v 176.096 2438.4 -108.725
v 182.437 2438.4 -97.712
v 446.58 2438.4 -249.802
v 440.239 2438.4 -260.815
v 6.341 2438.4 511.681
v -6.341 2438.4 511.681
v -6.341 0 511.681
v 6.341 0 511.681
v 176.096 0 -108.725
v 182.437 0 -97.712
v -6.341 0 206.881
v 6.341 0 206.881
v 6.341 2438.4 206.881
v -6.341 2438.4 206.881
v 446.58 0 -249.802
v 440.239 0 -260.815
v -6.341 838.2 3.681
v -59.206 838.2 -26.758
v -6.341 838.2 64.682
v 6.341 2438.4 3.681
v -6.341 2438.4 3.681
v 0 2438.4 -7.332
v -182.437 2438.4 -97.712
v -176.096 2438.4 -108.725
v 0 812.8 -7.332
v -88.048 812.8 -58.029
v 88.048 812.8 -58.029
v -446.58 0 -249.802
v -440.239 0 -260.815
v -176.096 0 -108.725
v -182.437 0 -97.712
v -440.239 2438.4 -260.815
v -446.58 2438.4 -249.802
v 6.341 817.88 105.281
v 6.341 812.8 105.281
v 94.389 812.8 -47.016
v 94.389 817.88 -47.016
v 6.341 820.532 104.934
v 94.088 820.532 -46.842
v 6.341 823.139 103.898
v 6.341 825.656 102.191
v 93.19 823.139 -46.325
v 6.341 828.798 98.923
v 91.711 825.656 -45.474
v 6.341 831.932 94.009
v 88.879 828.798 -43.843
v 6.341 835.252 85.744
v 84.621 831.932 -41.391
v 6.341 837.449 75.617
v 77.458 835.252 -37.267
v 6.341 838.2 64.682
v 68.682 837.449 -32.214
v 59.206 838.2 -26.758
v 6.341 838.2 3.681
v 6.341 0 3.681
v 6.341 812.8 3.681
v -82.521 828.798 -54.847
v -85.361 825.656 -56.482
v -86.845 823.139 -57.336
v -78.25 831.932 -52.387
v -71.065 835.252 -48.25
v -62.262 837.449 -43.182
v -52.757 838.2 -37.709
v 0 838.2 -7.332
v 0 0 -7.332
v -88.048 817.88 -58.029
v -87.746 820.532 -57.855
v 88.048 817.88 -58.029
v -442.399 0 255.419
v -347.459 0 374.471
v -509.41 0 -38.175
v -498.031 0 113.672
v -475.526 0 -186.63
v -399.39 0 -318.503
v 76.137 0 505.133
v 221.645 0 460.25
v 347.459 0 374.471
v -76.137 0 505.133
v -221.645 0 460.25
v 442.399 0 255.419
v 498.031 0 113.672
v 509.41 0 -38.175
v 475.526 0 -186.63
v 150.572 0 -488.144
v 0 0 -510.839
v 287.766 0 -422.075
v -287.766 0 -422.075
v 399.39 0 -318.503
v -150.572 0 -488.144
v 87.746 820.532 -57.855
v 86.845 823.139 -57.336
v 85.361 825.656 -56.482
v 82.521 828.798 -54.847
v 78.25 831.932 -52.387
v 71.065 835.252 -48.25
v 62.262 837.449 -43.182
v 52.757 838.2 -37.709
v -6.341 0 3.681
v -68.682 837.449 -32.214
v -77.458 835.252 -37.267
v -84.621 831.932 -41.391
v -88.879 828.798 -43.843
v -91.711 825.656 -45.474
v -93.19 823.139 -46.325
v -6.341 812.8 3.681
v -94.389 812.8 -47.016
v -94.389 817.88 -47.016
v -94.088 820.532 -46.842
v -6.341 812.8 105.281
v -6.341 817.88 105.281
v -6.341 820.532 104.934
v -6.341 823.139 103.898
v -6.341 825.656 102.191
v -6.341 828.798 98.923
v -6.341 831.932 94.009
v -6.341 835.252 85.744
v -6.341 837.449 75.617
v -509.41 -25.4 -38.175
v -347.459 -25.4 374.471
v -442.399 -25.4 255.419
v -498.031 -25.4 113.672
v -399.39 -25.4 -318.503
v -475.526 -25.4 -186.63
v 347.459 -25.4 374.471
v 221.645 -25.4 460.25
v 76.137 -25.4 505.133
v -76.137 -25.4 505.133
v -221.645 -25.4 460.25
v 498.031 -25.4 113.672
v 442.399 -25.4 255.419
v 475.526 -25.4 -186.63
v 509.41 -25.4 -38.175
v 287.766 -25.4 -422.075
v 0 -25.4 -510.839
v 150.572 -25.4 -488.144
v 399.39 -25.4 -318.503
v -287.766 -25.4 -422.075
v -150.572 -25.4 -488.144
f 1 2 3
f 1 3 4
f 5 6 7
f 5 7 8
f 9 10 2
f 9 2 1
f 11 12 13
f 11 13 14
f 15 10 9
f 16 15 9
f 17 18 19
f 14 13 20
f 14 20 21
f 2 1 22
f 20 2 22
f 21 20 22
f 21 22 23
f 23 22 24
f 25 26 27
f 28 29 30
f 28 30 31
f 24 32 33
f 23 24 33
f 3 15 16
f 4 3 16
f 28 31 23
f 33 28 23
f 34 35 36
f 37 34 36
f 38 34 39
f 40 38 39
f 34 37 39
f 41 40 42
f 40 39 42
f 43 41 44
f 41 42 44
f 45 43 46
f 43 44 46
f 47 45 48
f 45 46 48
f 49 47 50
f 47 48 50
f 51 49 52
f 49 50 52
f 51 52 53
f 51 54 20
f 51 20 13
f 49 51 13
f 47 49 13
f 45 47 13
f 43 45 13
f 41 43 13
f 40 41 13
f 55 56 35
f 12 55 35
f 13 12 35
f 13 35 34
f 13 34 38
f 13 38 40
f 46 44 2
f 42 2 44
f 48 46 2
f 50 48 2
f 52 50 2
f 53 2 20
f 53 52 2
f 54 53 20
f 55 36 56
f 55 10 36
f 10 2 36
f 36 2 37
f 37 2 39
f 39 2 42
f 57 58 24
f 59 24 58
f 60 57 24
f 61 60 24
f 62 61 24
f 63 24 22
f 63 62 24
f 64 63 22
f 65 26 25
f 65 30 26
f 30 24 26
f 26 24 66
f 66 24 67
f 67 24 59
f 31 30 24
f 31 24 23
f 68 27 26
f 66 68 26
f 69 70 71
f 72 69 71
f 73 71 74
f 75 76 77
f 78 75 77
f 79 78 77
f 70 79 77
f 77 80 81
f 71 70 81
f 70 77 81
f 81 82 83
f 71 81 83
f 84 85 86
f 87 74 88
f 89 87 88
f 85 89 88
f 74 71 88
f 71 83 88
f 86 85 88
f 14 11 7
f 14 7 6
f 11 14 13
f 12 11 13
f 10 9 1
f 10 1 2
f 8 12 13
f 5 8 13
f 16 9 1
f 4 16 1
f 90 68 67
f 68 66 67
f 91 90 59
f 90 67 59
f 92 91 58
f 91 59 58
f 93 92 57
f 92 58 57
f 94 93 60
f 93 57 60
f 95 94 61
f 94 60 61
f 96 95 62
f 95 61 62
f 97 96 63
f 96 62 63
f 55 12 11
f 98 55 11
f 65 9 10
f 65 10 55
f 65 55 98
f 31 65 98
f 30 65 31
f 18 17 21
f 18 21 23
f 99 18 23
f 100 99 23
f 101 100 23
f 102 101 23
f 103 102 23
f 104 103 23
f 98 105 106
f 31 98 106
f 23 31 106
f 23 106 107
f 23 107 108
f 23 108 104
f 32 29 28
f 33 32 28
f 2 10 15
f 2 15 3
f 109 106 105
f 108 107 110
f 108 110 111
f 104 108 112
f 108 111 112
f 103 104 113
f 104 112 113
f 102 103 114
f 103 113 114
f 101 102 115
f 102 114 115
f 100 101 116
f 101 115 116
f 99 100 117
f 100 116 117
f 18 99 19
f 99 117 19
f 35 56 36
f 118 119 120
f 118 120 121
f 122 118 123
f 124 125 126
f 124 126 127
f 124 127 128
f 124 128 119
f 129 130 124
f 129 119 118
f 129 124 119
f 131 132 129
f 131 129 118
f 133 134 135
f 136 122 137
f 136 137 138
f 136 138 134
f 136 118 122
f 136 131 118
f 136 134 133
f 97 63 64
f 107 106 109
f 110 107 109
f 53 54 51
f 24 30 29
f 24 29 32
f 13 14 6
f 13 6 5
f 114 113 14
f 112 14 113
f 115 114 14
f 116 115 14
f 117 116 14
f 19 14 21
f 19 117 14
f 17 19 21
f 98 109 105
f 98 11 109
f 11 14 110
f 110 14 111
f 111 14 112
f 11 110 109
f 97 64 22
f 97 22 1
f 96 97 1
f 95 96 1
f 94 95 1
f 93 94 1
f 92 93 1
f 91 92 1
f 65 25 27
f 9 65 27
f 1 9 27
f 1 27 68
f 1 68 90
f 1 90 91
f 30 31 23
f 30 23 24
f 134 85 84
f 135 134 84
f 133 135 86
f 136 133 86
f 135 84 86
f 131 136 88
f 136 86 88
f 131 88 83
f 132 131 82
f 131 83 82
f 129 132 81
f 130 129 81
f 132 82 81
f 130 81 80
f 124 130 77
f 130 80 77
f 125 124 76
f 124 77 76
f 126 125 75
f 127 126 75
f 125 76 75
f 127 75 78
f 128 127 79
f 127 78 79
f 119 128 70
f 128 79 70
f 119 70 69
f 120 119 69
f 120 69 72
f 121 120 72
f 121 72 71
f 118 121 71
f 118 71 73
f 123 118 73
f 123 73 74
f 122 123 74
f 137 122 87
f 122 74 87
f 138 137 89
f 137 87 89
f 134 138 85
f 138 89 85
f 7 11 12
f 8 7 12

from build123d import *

# Parameters (mm, degrees)
BOSS_EXTRUDE1_DEPTH  = 2438.4
SKETCH6_W            = 12.682512264
SKETCH6_H            = 2438.4
BOSS_EXTRUDE5_DEPTH  = 304.8
SKETCH7_W            = 12.708378748
SKETCH7_H            = 2438.4
BOSS_EXTRUDE6_DEPTH  = 304.8
SKETCH8_W            = 12.708378748
SKETCH8_H            = 2438.4
BOSS_EXTRUDE7_DEPTH  = 304.8
SKETCH9_R            = 510.838723735
BOSS_EXTRUDE9_DEPTH  = 25.4
BOSS_EXTRUDE14_START = 812.8
BOSS_EXTRUDE14_DEPTH = 25.4
FILLET1_R            = 20.32
BOSS_EXTRUDE16_START = 812.8
BOSS_EXTRUDE16_DEPTH = 25.4
FILLET2_R            = 20.32
BOSS_EXTRUDE17_START = 812.8
BOSS_EXTRUDE17_DEPTH = 25.4
FILLET3_R            = 20.32


with BuildPart() as part:
    # Sketch1 → Boss-Extrude1 (new body)
    with BuildSketch(Plane(origin=(0, 0, 0), x_dir=(1, 0, 0), z_dir=(0, 1, 0))):
        Polygon((-176.095593552, 108.725422563), (0, 7.332218), (176.095593552, 108.725422563), (182.436849684, 97.712186841), (6.341256132, -3.681017722), (6.341256132, -206.881017722), (-6.341256132, -206.881017722), (-6.341256132, -3.681017722), (-182.436849684, 97.712186841), align=None)
    extrude(amount=BOSS_EXTRUDE1_DEPTH)

    # Sketch11 → Boss-Extrude14 (add)
    with BuildSketch(Plane(origin=(0, 0, 0), x_dir=(1, 0, 0), z_dir=(0, 1, 0)).offset(BOSS_EXTRUDE14_START)):
        Polygon((0, 7.332218), (88.047796776, 58.028820281), (-88.047796776, 58.028820281), align=None)
    extrude(amount=BOSS_EXTRUDE14_DEPTH)

    # Fillet1
    fillet1_edges = [part.edges().sort_by_distance(p)[0] for p in [
        (0, 838.2, -58.028820281),
    ]]
    fillet(fillet1_edges, radius=FILLET1_R)

    # Sketch13 → Boss-Extrude16 (add)
    with BuildSketch(Plane(origin=(0, 0, 0), x_dir=(1, 0, 0), z_dir=(0, 1, 0)).offset(BOSS_EXTRUDE16_START)):
        Polygon((6.341256132, -3.681017722), (6.341256132, -105.281017722), (94.389052908, 47.01558456), align=None)
    extrude(amount=BOSS_EXTRUDE16_DEPTH)

    # Fillet2
    fillet2_edges = [part.edges().sort_by_distance(p)[0] for p in [
        (50.36515452, 838.2, 29.132716581),
    ]]
    fillet(fillet2_edges, radius=FILLET2_R)

    # Sketch14 → Boss-Extrude17 (add)
    with BuildSketch(Plane(origin=(0, 0, 0), x_dir=(1, 0, 0), z_dir=(0, 1, 0)).offset(BOSS_EXTRUDE17_START)):
        Polygon((-6.341256132, -3.681017722), (-94.389052908, 47.01558456), (-6.341256132, -105.281017722), align=None)
    extrude(amount=BOSS_EXTRUDE17_DEPTH)

    # Fillet3
    fillet3_edges = [part.edges().sort_by_distance(p)[0] for p in [
        (-50.36515452, 838.2, 29.132716581),
    ]]
    fillet(fillet3_edges, radius=FILLET3_R)


with BuildPart() as body_2:
    # Sketch6 → Boss-Extrude5 (new body)
    with BuildSketch(Plane.XY.offset(206.881017722)):
        with Locations((0, 1219.2)):
            Rectangle(SKETCH6_W, SKETCH6_H)
    extrude(amount=BOSS_EXTRUDE5_DEPTH)


with BuildPart() as body_3:
    # Sketch7 → Boss-Extrude6 (new body)
    with BuildSketch(Plane(origin=(179.266221618, 0, -103.218804702), x_dir=(-0.49898230591919734, 0, -0.8666121729929489), z_dir=(0.8666121729929489, 0, -0.49898230591919734))):
        with Locations((0, 1219.2)):
            Rectangle(SKETCH7_W, SKETCH7_H)
    extrude(amount=BOSS_EXTRUDE6_DEPTH)


with BuildPart() as body_4:
    # Sketch8 → Boss-Extrude7 (new body)
    with BuildSketch(Plane(origin=(-179.266221618, 0, -103.218804702), x_dir=(-0.49898230591919357, 0, 0.866612172992951), z_dir=(-0.8666121729929509, 0, -0.4989823059191935))):
        with Locations((0, 1219.2)):
            Rectangle(SKETCH8_W, SKETCH8_H)
    extrude(amount=BOSS_EXTRUDE7_DEPTH)


with BuildPart() as body_5:
    # Sketch9 → Boss-Extrude9 (new body)
    with BuildSketch(Plane.XZ):
        with Locations(Location((0, 0, 0), (0, 0, 270))):
            Circle(SKETCH9_R)
    extrude(amount=BOSS_EXTRUDE9_DEPTH)


solid = Compound([part.part, body_2.part, body_3.part, body_4.part, body_5.part])
